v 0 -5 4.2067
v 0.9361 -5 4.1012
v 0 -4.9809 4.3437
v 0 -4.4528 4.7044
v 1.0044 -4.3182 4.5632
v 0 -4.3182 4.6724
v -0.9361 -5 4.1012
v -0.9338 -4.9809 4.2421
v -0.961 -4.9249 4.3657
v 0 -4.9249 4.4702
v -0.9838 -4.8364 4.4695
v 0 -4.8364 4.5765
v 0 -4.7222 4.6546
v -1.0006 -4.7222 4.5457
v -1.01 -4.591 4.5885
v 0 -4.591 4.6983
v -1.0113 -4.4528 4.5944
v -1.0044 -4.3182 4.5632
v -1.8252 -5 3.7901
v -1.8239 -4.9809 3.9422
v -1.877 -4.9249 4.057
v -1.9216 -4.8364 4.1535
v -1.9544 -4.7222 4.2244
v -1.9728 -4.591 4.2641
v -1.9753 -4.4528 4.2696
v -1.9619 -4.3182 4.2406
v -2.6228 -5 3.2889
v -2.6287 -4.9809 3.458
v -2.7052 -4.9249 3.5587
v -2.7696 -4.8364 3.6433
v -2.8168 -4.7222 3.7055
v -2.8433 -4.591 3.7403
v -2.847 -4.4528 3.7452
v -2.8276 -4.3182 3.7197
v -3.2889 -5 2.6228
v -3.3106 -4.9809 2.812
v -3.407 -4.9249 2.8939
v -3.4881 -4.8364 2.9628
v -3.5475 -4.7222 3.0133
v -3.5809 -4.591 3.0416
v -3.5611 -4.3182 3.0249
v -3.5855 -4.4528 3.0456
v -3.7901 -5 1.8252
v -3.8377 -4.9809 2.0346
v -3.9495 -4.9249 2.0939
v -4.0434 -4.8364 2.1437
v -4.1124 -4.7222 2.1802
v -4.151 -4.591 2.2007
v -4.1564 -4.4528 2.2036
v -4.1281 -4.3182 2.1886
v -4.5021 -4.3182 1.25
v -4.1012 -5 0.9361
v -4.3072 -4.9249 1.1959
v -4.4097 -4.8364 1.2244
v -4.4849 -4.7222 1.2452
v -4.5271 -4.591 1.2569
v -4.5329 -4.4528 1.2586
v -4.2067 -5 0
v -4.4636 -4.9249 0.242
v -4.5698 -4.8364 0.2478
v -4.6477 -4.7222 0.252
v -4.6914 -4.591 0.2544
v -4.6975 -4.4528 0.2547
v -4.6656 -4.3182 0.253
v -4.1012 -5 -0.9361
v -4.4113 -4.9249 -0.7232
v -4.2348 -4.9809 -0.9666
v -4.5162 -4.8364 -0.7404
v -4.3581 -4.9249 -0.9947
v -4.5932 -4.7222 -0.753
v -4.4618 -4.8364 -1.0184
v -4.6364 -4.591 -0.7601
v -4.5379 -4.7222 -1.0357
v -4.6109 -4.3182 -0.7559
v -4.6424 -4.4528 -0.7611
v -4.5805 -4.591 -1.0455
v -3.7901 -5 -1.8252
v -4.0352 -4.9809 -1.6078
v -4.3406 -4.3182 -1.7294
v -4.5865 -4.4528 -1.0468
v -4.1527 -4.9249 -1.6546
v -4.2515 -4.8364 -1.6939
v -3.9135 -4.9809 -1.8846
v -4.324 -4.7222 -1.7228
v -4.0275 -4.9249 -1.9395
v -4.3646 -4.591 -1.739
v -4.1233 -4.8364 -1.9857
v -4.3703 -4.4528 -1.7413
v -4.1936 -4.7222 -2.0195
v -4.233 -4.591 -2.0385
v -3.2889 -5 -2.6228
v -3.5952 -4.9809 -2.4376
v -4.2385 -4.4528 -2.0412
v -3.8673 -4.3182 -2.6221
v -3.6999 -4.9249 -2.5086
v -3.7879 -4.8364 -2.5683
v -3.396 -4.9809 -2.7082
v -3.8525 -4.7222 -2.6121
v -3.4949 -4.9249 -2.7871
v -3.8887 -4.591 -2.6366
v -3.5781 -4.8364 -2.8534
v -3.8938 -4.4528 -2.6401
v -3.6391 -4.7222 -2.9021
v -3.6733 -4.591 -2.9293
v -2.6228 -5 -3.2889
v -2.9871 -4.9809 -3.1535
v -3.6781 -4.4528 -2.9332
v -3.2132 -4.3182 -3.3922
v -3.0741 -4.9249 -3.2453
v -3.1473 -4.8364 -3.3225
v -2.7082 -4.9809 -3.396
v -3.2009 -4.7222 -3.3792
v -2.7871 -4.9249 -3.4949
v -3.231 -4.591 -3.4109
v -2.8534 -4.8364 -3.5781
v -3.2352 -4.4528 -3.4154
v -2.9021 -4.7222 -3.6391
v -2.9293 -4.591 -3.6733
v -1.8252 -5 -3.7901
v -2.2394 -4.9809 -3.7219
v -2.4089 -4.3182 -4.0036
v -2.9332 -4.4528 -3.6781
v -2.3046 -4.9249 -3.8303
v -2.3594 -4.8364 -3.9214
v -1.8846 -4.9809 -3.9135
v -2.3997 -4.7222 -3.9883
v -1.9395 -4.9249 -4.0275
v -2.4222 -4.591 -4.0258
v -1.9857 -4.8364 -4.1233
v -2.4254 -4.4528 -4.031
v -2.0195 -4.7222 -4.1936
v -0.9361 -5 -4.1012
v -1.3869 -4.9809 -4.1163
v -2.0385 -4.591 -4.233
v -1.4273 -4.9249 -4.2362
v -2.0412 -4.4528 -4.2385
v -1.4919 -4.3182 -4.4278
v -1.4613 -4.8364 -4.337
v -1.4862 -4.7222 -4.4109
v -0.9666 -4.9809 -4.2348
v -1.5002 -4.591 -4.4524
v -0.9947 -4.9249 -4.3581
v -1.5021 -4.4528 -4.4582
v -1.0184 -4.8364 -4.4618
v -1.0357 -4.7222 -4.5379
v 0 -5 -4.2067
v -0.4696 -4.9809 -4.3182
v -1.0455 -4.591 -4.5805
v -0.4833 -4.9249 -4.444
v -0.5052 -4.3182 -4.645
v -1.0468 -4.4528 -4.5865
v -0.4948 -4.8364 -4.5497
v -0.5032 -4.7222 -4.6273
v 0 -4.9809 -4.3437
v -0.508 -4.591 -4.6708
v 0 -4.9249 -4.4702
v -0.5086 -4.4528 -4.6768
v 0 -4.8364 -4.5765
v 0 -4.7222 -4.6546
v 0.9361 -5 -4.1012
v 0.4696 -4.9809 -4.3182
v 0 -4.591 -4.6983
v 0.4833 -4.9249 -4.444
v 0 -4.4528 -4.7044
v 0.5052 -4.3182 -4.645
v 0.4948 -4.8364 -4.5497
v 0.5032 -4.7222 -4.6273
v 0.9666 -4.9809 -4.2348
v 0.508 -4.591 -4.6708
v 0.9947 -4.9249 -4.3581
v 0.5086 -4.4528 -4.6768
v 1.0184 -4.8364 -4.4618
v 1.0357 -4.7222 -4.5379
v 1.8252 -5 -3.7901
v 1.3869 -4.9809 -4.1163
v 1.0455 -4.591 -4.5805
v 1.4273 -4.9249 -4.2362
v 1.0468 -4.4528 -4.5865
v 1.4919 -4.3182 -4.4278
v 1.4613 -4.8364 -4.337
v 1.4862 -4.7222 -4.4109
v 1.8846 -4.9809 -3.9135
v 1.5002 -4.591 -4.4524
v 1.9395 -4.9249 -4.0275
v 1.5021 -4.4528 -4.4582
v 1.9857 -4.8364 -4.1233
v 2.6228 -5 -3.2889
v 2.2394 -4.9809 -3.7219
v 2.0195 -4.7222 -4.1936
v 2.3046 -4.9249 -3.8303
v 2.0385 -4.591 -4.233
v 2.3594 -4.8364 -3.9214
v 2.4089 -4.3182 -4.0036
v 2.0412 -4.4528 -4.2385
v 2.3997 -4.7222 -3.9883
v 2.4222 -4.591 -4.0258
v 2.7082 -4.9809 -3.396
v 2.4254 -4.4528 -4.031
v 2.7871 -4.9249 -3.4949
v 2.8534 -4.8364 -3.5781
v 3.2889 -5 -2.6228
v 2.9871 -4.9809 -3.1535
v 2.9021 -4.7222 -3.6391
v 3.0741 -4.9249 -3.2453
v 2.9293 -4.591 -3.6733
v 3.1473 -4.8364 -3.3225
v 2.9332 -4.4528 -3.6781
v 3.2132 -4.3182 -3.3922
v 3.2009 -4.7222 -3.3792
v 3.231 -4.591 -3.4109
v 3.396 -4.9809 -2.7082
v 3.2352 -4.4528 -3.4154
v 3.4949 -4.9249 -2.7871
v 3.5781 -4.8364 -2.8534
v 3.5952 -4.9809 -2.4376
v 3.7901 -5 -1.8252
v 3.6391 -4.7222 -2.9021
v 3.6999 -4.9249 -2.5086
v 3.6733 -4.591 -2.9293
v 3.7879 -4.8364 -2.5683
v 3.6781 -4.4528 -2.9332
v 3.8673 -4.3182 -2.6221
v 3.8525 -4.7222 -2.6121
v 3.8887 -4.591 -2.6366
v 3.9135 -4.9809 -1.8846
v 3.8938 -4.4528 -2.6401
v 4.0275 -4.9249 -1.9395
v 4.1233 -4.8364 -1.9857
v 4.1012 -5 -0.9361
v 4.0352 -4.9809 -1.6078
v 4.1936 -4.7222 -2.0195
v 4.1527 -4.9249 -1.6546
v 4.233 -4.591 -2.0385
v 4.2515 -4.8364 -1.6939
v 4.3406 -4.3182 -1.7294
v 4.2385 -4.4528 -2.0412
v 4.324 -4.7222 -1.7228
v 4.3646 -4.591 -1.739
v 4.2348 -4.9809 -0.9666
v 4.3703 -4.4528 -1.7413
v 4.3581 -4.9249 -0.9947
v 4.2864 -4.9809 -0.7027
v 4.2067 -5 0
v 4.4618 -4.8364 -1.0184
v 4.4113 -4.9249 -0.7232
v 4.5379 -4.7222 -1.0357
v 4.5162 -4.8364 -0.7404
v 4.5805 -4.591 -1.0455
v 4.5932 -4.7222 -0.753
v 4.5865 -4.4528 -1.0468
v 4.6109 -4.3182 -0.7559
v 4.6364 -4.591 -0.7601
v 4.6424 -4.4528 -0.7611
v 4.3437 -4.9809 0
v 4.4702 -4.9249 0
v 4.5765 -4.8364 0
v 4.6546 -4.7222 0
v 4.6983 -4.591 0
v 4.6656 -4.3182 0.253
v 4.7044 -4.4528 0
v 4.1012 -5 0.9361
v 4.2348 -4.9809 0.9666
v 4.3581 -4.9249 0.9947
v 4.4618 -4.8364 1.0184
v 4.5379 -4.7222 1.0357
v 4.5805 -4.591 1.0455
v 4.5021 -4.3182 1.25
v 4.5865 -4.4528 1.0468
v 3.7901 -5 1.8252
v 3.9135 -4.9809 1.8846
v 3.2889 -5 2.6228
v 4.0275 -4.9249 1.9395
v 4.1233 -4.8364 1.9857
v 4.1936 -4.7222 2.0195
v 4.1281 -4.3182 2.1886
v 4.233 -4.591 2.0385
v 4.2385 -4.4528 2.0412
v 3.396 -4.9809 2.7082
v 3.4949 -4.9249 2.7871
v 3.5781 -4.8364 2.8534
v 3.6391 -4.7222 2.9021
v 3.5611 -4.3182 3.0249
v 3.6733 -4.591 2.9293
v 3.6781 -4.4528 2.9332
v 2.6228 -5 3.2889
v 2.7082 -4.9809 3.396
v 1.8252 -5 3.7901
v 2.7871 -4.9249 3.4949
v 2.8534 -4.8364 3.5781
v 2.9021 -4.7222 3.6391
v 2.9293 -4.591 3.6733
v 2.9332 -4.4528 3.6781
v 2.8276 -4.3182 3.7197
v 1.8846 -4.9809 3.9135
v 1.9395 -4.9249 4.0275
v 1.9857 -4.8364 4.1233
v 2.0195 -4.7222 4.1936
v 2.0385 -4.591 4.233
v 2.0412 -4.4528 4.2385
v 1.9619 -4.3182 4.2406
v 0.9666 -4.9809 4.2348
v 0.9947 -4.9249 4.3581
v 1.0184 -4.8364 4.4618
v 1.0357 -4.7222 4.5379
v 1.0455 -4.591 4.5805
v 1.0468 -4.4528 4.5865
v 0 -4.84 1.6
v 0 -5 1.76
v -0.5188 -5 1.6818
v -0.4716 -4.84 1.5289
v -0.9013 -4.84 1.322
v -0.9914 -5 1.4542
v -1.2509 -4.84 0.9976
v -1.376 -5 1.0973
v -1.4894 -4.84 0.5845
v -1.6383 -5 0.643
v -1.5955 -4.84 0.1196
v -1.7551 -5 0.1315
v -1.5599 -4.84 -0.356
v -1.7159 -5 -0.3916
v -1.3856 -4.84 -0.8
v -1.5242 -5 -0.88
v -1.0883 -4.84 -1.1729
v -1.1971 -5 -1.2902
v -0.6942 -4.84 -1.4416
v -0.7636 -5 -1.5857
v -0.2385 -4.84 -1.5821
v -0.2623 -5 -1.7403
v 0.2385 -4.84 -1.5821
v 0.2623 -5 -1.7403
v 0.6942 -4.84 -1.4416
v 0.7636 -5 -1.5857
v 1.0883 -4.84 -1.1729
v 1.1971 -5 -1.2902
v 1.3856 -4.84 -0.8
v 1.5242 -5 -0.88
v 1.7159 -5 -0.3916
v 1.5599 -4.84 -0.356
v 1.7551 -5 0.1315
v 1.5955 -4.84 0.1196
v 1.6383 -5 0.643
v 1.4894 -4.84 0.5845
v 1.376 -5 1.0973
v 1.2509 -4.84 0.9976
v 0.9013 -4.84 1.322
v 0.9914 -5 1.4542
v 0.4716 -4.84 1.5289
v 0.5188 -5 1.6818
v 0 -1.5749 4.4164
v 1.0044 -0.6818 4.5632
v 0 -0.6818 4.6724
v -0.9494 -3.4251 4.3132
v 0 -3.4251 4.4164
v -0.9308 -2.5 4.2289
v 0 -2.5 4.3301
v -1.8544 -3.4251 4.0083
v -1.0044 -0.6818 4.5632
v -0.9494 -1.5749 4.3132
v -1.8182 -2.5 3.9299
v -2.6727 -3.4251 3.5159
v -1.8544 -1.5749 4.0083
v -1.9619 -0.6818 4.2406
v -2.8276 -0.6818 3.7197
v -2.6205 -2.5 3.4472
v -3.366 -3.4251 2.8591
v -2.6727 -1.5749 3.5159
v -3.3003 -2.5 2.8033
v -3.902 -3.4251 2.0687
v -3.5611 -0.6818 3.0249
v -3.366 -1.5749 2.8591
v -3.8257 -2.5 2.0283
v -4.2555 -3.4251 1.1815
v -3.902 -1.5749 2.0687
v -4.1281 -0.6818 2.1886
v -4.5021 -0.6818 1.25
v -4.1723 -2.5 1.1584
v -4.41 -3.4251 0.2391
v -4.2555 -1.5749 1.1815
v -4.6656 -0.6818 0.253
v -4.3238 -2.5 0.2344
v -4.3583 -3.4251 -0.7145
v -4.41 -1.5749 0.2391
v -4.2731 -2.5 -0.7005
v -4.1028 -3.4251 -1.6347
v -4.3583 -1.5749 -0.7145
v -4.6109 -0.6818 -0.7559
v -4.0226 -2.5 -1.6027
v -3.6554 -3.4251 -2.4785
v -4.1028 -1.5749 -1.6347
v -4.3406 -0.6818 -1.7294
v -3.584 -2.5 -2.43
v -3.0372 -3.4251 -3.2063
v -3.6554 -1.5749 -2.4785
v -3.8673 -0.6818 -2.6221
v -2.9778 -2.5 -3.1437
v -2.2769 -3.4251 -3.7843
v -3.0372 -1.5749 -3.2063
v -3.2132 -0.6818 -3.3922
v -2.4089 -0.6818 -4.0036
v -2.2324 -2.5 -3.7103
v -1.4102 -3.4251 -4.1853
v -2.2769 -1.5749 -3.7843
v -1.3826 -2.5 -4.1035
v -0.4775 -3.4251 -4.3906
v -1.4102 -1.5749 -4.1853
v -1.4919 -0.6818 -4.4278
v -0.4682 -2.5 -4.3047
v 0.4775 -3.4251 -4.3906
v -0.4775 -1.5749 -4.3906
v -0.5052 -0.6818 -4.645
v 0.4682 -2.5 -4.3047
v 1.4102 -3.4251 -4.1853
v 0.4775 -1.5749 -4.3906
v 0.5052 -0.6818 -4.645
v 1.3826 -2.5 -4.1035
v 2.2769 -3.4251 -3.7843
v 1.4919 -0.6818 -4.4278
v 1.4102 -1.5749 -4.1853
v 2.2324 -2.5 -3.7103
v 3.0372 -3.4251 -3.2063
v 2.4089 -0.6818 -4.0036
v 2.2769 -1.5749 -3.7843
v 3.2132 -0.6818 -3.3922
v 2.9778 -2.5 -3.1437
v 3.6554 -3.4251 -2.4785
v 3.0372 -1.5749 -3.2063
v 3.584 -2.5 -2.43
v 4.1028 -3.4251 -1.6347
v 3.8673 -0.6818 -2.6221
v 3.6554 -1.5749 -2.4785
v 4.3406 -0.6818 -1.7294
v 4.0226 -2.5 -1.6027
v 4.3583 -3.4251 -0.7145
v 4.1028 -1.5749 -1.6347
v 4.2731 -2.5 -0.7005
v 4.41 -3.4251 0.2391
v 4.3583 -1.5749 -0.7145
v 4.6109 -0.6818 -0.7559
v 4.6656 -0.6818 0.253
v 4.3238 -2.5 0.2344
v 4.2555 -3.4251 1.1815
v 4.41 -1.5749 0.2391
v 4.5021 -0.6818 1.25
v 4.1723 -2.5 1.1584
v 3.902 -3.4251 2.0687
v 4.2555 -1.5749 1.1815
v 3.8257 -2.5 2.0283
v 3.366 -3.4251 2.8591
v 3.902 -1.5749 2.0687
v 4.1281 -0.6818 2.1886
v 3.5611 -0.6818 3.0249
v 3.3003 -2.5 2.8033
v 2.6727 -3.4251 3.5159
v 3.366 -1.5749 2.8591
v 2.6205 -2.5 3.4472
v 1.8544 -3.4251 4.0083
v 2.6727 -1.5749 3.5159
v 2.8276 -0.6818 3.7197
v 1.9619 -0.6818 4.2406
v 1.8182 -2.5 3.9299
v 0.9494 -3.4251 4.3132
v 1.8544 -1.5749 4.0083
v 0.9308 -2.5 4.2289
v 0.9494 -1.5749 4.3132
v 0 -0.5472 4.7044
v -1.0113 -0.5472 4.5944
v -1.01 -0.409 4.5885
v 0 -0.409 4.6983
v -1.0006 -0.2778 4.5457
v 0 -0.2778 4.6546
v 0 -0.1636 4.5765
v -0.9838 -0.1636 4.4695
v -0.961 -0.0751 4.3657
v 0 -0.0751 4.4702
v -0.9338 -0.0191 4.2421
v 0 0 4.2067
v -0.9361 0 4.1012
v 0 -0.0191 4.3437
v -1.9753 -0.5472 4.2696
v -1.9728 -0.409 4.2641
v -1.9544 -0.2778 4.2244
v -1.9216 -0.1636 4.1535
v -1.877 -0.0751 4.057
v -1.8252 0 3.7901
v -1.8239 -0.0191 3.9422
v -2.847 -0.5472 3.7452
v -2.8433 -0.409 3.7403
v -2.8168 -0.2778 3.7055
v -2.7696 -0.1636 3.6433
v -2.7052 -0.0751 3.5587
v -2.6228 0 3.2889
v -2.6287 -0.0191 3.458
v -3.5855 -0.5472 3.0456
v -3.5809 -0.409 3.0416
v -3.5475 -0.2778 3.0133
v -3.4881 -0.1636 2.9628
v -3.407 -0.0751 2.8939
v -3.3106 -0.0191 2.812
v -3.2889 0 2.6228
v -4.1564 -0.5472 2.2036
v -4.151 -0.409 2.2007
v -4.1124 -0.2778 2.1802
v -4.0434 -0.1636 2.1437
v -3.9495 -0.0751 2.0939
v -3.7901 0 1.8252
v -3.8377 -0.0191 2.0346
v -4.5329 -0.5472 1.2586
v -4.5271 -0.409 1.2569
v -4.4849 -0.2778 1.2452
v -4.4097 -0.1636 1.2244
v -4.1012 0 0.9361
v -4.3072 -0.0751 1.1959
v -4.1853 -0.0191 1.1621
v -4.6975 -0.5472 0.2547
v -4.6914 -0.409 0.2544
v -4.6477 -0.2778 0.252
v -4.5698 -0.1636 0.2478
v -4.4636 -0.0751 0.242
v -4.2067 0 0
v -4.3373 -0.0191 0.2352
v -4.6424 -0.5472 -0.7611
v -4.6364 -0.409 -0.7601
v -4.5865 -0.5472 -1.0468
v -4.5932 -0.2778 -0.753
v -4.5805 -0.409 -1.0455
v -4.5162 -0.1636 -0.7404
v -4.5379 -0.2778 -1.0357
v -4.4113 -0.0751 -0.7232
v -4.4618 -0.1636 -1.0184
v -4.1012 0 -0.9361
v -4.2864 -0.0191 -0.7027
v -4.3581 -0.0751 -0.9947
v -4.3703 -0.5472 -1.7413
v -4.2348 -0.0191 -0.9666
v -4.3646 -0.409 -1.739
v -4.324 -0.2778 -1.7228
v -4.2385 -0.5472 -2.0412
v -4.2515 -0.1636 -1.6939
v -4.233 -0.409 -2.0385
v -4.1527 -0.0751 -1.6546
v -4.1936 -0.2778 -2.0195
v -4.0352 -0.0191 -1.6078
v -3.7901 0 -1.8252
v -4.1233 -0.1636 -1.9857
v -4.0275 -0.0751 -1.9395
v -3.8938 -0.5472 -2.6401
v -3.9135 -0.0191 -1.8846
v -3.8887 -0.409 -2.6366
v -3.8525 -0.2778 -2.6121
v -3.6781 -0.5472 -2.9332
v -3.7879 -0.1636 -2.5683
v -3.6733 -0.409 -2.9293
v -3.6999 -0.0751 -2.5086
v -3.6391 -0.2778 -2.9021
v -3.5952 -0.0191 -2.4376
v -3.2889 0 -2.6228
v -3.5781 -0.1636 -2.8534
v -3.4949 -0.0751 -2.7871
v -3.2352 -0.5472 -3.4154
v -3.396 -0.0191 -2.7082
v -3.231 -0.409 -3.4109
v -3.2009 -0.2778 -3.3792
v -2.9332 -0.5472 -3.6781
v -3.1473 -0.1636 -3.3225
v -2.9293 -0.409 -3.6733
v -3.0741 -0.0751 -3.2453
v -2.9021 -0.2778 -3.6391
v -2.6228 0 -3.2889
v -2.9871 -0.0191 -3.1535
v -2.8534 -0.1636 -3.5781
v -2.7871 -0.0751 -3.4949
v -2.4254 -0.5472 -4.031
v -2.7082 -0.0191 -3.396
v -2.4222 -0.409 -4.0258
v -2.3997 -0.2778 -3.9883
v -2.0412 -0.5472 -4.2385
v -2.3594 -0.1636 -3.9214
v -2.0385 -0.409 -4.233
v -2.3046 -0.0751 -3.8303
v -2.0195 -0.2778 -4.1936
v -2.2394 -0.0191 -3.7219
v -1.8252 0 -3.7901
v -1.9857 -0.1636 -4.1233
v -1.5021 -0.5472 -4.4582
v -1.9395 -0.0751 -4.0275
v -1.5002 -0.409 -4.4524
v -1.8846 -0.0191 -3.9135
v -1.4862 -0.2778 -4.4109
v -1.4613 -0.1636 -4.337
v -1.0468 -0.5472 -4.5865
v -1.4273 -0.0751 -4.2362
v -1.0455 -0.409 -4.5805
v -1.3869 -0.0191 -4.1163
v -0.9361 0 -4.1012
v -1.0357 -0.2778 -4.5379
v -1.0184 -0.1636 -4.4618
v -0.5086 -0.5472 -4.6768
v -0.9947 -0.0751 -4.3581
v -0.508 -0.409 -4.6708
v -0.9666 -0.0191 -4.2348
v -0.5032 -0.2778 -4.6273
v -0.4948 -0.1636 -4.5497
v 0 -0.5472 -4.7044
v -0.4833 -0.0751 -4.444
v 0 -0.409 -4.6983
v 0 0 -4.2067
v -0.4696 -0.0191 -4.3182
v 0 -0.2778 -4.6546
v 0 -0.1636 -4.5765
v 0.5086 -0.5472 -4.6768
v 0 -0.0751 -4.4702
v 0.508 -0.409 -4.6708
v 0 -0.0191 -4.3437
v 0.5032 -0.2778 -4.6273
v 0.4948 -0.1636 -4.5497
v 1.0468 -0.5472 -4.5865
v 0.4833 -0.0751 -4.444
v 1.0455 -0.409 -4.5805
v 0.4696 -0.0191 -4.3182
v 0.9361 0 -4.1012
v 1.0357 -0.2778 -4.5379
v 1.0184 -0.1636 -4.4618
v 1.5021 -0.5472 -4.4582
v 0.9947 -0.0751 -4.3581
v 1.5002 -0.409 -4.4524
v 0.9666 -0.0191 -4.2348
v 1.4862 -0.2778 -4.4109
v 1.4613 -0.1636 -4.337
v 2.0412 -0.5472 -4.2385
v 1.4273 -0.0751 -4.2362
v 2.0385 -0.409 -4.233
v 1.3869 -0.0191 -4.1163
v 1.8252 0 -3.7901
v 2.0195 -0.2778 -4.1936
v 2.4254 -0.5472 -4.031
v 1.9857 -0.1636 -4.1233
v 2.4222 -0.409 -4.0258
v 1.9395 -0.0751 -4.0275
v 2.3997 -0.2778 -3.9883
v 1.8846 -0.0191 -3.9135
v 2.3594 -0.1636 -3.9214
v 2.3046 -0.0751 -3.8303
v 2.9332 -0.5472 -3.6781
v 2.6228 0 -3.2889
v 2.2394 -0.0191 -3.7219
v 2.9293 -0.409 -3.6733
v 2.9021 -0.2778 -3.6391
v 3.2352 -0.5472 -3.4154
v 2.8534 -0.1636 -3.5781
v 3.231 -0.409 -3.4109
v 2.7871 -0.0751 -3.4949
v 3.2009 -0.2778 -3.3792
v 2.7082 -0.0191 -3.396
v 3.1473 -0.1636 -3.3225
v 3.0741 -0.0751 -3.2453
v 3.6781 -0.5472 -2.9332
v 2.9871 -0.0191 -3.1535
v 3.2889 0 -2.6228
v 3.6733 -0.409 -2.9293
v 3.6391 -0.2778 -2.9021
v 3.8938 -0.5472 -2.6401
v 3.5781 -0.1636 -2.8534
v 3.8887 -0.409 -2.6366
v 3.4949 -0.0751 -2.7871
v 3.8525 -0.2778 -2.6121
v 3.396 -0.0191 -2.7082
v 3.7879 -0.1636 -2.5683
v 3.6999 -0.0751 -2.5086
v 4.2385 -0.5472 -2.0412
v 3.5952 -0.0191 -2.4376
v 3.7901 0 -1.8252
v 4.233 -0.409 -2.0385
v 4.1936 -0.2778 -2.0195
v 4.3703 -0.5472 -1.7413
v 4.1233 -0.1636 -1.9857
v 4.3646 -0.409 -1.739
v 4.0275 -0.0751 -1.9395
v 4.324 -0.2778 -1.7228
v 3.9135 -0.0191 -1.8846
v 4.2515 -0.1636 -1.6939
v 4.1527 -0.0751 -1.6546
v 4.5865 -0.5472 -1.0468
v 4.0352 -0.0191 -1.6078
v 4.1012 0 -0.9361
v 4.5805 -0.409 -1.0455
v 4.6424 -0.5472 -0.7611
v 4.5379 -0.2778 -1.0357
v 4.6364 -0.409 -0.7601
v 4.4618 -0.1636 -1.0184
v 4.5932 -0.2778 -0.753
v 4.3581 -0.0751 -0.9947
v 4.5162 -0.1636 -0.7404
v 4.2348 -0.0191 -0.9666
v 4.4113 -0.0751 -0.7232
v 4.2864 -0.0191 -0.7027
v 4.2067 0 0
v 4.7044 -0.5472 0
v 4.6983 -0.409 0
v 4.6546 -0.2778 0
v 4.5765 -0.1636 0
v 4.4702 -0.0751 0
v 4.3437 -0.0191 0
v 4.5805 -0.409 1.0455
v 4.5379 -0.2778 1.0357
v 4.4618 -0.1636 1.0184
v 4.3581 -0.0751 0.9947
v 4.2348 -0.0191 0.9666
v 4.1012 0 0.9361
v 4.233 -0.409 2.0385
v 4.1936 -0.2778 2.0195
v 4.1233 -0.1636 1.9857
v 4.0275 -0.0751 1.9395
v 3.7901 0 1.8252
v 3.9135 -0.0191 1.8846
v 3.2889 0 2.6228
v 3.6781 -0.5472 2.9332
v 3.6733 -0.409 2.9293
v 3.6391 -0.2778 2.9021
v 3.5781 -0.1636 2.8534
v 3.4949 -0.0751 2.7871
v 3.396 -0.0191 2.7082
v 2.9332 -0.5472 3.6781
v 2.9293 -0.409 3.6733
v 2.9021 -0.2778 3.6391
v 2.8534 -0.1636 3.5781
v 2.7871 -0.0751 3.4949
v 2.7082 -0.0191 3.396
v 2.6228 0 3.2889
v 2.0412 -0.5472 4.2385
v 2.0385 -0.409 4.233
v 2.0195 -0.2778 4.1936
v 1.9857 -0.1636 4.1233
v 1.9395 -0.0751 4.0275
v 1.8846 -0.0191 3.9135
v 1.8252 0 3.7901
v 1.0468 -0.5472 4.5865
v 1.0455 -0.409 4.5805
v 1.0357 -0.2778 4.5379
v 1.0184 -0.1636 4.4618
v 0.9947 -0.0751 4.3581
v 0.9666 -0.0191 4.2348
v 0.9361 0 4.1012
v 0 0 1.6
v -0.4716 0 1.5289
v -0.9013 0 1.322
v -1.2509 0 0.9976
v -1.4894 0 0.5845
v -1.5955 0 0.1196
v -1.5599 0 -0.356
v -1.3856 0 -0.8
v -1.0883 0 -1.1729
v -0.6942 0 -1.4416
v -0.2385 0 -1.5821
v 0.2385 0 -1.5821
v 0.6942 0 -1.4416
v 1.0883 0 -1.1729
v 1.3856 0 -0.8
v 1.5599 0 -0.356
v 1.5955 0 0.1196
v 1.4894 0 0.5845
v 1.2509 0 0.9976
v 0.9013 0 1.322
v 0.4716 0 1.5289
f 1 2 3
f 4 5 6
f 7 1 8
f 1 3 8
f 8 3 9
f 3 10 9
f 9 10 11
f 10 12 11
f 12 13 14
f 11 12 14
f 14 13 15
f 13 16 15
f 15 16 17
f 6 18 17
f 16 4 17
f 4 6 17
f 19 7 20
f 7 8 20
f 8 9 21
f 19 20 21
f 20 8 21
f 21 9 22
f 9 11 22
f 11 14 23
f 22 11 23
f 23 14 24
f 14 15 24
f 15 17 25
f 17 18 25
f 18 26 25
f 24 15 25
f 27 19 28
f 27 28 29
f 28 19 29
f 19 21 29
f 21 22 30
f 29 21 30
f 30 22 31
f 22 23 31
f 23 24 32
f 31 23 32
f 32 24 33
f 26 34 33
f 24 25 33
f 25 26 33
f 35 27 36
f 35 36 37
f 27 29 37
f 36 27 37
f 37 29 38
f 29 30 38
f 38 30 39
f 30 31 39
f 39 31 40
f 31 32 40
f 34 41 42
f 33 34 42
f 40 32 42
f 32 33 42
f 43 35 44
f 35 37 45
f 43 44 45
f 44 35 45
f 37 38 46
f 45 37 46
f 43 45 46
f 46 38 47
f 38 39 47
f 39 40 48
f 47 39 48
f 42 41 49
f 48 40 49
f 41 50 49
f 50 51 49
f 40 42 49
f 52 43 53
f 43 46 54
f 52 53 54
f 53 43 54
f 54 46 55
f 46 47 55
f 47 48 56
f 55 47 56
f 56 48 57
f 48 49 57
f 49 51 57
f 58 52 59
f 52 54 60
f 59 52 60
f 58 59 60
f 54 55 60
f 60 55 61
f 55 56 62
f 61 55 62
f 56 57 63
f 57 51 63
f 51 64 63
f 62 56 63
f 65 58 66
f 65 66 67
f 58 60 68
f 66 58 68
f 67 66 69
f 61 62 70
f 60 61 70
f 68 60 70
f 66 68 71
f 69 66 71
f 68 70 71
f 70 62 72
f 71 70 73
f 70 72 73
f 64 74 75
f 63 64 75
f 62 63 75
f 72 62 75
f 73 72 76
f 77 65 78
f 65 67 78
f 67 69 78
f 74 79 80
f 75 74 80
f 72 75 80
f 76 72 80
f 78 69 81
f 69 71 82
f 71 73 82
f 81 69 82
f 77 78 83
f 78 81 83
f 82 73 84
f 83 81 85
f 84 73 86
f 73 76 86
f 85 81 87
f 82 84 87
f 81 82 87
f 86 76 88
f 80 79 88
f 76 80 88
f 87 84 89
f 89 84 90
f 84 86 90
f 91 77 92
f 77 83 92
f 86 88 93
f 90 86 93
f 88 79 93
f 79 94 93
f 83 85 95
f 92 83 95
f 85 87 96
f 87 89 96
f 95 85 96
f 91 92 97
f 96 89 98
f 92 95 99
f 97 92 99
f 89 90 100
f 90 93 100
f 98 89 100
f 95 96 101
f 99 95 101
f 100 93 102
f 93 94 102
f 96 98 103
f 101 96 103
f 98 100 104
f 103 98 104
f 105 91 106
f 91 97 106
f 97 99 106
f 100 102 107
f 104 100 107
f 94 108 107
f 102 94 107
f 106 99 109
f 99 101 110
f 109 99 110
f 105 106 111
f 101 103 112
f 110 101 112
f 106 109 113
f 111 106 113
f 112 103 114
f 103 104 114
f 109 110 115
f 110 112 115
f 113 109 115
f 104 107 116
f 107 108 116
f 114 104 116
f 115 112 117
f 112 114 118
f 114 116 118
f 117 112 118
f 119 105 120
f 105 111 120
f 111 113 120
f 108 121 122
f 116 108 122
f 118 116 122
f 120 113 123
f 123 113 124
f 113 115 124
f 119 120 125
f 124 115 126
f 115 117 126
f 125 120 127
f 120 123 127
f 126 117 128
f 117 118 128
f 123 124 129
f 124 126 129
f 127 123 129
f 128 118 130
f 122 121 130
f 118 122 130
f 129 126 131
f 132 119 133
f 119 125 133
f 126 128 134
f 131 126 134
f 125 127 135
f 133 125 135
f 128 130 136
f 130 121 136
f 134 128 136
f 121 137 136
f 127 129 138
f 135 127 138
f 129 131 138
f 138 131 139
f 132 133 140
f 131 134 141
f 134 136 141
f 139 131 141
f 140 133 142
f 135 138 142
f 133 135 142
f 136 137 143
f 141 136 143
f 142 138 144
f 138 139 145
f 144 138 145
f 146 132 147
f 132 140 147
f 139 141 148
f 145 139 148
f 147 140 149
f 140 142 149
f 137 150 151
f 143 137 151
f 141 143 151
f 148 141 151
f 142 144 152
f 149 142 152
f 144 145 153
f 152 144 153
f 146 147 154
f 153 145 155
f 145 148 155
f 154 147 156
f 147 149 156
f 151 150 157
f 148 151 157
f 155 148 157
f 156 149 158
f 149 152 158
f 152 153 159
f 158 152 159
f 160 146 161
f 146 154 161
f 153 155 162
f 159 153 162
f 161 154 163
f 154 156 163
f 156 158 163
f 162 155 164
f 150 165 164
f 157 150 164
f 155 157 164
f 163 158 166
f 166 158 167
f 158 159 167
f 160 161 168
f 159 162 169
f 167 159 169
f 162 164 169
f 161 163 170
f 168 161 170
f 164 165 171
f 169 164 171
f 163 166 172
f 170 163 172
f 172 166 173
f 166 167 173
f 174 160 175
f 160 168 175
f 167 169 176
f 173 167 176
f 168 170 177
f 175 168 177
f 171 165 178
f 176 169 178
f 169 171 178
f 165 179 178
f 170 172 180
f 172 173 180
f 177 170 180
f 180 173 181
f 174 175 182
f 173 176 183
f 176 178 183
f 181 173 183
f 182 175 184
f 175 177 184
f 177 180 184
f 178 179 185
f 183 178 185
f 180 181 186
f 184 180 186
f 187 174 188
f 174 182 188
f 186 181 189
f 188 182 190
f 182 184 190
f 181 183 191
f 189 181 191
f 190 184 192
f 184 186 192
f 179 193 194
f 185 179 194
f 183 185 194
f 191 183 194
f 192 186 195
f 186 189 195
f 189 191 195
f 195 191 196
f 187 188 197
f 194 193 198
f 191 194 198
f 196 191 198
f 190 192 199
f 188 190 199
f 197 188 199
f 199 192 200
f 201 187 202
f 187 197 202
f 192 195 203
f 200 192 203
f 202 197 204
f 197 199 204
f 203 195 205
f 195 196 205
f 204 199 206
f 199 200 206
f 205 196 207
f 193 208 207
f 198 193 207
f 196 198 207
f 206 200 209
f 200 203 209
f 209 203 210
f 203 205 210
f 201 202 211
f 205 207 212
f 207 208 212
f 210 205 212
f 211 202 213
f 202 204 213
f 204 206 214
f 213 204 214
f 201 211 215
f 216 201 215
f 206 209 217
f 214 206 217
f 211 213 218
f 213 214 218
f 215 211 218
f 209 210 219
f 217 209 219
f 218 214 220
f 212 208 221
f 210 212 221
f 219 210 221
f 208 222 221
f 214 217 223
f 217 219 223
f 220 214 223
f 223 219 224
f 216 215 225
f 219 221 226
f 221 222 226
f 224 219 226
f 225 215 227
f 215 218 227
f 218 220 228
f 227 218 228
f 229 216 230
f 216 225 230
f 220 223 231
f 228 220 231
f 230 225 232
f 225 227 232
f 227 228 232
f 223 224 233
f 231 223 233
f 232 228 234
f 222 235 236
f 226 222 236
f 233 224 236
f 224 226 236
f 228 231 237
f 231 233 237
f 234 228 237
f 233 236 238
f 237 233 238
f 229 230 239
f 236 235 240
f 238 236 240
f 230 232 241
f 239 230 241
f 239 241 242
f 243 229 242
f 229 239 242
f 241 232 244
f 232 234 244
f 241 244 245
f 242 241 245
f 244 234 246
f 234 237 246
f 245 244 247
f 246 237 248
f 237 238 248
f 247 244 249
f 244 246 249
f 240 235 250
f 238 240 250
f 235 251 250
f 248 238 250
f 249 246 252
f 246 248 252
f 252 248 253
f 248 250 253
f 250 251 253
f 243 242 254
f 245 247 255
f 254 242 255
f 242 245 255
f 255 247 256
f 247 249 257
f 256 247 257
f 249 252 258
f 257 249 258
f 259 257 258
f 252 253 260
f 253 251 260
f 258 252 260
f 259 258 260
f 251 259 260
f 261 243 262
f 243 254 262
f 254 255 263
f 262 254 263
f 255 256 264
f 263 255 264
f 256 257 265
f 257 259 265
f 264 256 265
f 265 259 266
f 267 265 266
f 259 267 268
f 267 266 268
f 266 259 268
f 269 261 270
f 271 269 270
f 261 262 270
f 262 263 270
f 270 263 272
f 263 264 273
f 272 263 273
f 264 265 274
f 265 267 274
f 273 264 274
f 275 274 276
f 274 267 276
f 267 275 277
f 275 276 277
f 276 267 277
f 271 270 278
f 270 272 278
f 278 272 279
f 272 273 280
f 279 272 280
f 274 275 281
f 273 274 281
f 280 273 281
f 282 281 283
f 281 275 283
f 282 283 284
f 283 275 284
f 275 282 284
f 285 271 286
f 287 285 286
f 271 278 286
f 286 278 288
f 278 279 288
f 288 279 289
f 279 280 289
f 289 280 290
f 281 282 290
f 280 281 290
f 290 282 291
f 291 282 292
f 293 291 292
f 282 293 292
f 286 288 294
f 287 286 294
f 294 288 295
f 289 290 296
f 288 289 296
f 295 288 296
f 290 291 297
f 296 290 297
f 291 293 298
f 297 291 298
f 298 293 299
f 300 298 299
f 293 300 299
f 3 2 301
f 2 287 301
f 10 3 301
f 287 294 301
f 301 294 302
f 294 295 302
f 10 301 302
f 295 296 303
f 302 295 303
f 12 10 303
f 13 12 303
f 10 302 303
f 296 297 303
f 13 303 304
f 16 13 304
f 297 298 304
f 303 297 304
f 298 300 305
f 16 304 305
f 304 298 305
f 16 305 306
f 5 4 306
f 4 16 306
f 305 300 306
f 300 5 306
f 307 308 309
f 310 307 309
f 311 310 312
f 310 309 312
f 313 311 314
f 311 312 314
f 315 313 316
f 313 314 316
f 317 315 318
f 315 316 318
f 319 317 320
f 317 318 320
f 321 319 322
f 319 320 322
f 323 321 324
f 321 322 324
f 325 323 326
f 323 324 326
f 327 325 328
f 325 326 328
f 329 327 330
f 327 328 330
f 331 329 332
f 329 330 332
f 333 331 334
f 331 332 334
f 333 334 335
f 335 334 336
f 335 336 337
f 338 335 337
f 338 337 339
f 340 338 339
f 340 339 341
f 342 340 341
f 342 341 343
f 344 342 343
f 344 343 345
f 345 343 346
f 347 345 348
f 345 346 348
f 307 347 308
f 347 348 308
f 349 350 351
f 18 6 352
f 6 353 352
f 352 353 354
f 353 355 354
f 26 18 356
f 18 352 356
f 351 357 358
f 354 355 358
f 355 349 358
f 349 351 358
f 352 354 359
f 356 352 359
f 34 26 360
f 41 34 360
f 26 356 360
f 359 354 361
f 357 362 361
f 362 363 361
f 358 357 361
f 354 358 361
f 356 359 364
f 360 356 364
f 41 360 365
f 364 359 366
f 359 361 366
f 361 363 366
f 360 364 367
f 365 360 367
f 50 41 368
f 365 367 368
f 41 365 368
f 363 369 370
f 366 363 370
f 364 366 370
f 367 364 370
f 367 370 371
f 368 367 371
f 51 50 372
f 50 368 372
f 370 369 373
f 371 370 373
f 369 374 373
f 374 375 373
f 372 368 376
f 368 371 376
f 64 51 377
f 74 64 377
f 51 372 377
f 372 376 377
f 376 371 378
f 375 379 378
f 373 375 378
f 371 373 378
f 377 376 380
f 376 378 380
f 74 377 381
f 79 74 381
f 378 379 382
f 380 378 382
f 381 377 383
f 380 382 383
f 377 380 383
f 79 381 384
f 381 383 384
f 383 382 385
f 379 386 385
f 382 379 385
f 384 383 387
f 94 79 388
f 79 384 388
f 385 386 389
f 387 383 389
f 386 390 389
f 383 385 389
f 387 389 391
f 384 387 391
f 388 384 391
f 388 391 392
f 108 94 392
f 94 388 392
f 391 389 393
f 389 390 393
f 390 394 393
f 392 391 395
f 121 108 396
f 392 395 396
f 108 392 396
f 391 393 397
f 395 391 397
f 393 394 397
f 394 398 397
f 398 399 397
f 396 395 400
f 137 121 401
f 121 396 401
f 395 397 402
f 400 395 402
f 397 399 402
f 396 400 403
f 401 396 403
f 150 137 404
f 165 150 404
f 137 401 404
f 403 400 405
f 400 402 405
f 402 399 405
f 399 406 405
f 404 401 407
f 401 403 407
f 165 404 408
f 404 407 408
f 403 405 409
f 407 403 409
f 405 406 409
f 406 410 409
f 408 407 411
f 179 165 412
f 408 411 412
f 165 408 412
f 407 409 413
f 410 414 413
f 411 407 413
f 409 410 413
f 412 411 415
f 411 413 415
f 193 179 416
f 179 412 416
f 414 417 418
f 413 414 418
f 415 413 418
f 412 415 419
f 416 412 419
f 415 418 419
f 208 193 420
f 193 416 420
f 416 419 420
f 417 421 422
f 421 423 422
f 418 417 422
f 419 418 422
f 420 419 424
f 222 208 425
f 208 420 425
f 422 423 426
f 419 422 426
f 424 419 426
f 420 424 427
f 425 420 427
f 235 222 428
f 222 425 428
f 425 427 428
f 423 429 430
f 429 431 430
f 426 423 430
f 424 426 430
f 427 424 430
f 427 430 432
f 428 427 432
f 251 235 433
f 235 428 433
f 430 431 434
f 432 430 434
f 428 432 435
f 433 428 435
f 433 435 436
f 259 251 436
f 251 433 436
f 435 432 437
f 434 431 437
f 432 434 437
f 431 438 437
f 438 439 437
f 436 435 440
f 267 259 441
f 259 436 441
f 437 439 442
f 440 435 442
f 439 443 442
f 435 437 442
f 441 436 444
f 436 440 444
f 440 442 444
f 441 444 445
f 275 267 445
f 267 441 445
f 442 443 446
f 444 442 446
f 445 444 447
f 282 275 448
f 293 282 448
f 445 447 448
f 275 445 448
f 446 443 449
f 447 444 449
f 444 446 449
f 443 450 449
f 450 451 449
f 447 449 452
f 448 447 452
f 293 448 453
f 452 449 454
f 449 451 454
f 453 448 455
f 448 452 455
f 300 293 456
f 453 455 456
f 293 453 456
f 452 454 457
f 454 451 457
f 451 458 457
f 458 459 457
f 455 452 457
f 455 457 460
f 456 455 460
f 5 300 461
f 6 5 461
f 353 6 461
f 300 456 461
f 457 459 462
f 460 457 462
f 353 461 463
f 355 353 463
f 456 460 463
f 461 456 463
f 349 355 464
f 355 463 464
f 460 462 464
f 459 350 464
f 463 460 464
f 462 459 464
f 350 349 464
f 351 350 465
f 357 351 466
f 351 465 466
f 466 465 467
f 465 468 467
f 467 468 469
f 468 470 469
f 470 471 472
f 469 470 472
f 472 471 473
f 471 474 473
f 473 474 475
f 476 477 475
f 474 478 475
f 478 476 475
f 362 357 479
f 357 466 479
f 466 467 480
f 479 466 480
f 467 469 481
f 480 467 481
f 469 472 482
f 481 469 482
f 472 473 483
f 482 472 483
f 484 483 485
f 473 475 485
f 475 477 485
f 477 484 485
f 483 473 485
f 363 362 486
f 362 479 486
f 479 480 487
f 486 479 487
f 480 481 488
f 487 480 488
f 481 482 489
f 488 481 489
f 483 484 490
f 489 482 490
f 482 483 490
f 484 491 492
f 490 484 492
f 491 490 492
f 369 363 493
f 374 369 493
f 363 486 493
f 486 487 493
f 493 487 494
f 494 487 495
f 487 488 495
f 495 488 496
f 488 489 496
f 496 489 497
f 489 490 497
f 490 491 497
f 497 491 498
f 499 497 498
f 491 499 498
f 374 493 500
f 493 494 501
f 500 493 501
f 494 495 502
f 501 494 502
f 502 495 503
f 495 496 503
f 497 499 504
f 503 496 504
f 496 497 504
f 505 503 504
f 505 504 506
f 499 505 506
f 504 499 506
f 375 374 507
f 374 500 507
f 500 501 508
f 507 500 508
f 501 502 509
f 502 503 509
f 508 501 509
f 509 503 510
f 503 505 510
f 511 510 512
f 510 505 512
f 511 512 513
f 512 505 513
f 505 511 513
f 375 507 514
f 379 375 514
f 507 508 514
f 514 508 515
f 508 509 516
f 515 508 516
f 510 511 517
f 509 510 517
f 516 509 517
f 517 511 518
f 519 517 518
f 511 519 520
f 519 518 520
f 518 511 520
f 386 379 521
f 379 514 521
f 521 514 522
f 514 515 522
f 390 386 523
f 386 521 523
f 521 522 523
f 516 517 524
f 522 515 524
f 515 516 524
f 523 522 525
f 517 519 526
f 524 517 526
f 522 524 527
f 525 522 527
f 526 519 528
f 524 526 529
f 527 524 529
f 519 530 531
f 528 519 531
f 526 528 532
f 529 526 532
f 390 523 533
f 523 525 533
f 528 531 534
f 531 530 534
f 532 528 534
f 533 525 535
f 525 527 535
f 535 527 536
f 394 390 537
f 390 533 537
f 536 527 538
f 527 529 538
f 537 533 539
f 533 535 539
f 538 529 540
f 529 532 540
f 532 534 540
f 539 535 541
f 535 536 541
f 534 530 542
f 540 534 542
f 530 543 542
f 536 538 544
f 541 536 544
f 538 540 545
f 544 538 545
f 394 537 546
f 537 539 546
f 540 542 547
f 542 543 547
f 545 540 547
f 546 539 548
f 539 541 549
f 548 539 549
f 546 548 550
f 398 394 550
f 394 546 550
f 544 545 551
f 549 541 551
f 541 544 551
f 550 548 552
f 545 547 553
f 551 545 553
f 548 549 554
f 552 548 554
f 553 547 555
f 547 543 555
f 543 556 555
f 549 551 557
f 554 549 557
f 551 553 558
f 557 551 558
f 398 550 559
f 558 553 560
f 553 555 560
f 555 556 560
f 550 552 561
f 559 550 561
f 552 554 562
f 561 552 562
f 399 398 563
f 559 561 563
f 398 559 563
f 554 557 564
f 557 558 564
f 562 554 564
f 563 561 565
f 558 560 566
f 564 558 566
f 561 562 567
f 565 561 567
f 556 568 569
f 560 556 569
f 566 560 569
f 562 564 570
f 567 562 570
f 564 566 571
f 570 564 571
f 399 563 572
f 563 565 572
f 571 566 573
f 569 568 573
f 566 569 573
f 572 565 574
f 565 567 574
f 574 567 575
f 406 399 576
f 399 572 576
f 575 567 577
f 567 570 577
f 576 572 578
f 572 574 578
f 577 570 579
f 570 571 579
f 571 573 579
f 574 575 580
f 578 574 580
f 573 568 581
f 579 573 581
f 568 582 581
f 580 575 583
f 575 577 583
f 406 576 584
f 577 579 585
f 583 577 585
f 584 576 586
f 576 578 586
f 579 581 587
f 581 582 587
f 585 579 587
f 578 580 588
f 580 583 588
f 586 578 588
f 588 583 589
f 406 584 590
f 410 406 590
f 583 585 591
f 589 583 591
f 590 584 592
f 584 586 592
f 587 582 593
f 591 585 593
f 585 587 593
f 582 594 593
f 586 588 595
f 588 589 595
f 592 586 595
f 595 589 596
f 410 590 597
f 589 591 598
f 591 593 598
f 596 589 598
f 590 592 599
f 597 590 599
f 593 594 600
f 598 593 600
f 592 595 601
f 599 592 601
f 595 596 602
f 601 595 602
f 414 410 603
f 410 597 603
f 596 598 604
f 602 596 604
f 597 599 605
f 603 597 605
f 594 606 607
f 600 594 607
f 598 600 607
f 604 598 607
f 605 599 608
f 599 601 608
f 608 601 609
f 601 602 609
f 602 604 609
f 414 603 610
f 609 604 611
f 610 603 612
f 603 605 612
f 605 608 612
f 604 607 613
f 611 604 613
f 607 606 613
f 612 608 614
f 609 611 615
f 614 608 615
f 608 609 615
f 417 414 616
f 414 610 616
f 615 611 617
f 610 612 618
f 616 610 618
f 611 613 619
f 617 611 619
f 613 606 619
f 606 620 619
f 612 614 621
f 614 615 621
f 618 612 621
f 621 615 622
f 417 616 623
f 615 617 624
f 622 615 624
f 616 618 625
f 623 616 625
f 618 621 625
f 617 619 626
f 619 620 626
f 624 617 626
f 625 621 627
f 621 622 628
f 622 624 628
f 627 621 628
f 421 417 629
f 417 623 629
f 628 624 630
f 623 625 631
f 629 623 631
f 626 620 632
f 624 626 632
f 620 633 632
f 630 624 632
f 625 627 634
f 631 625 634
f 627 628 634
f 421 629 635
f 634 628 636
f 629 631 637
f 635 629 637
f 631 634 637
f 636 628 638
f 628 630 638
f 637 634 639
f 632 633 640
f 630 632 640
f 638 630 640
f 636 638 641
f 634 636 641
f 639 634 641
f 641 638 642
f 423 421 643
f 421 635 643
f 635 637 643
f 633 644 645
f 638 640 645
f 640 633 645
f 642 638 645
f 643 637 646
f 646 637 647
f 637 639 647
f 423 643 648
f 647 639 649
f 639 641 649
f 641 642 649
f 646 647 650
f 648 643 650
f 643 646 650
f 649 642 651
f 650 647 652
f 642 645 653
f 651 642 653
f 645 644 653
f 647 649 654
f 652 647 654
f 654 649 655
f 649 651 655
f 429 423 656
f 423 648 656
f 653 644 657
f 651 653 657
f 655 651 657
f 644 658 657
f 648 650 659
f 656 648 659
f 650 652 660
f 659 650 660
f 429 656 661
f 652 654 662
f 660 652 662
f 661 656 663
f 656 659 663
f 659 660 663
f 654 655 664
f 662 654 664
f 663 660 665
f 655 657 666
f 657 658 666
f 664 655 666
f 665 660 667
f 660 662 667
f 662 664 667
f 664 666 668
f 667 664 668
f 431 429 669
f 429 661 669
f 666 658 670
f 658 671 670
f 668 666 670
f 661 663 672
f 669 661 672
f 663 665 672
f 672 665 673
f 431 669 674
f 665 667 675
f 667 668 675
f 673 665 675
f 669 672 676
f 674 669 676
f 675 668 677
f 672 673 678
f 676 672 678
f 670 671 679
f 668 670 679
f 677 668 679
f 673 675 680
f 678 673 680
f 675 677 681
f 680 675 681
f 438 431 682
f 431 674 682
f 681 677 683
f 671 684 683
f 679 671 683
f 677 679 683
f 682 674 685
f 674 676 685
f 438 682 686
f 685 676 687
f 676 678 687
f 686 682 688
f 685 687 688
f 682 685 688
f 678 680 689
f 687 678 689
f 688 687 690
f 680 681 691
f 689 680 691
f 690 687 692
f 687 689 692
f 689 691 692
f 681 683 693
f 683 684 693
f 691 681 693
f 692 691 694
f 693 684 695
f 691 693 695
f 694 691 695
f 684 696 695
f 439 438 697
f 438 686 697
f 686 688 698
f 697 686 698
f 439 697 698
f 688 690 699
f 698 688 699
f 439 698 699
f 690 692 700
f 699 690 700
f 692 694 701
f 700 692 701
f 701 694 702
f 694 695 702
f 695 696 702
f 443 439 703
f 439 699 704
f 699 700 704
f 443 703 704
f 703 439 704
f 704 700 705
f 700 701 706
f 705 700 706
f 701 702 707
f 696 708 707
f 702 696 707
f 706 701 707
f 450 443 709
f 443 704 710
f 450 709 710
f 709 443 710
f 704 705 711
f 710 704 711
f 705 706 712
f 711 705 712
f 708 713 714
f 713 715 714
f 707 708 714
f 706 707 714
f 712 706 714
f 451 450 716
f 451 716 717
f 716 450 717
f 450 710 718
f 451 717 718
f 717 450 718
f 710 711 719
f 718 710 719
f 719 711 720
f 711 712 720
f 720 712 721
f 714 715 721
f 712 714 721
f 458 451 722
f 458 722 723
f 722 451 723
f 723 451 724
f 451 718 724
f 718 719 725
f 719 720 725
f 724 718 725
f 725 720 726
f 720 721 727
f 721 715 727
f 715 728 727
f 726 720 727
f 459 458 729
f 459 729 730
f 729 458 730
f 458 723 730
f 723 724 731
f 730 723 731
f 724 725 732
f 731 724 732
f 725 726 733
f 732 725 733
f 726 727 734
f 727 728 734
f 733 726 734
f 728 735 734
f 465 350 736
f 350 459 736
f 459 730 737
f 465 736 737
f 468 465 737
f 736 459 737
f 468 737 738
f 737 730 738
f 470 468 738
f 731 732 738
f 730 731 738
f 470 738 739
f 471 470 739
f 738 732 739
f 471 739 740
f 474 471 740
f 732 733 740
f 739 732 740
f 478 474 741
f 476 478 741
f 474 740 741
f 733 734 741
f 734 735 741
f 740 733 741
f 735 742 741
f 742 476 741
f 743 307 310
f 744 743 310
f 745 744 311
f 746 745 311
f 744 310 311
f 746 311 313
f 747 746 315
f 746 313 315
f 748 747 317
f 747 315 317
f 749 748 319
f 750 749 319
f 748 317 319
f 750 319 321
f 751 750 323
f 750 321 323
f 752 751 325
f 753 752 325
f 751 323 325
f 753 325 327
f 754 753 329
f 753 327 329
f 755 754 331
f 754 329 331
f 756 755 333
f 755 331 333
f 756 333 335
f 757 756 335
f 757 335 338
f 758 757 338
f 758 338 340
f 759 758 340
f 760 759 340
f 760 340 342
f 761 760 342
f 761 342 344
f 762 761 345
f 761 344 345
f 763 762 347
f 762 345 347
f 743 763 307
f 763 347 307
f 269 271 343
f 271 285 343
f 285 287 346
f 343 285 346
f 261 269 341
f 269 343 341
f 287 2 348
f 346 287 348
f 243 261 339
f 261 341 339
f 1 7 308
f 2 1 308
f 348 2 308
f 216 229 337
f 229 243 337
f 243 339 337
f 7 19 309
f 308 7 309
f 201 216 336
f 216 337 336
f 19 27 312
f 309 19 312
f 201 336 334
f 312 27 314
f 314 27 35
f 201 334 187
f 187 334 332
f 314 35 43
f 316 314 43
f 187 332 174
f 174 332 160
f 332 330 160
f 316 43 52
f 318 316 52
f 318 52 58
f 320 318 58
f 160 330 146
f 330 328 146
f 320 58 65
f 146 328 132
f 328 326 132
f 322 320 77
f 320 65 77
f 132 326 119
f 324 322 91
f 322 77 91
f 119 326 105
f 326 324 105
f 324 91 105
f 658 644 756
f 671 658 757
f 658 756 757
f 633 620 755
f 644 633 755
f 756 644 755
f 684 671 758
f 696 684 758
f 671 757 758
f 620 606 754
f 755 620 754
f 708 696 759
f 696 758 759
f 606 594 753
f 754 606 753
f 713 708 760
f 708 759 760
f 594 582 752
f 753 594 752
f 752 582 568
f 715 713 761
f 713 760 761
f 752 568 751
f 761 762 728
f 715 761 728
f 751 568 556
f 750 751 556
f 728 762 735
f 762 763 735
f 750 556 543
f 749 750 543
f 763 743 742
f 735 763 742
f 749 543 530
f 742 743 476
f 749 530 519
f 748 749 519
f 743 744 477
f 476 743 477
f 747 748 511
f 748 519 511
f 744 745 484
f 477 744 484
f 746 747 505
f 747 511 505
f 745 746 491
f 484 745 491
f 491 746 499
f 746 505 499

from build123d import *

# Parameters (mm, degrees)
CHAMFER1_SIZE = 0.16


with BuildPart() as part:
    # Sketch1 → Revolve1 (revolve)
    with BuildSketch(Plane.XY, mode=Mode.PRIVATE) as revolve1_sk:
        with BuildLine():
            Line((-4.206651636, 0), (-1.6, 0))
            Line((-1.6, 0), (-1.6, -5))
            Line((-1.6, -5), (-4.206651636, -5))
            ThreePointArc((-4.206651636, -5), (-4.619513048, -4.782038037), (-4.672422125, -4.318181818))
            ThreePointArc((-4.672422125, -4.318181818), (-4.330127019, -2.5), (-4.672422125, -0.681818182))
            ThreePointArc((-4.672422125, -0.681818182), (-4.619513048, -0.217961963), (-4.206651636, 0))
        make_face()
    revolve(revolve1_sk.sketch.rotate(Axis((0, 0, 0), (0, -1, 0)), 270), axis=Axis((0, 0, 0), (0, -1, 0)))

    # Chamfer1
    chamfer1_edges = [part.edges().sort_by_distance(p)[0] for p in [
        (0, -5, -1.6),
    ]]
    chamfer(chamfer1_edges, length=CHAMFER1_SIZE)


solid = part.part
